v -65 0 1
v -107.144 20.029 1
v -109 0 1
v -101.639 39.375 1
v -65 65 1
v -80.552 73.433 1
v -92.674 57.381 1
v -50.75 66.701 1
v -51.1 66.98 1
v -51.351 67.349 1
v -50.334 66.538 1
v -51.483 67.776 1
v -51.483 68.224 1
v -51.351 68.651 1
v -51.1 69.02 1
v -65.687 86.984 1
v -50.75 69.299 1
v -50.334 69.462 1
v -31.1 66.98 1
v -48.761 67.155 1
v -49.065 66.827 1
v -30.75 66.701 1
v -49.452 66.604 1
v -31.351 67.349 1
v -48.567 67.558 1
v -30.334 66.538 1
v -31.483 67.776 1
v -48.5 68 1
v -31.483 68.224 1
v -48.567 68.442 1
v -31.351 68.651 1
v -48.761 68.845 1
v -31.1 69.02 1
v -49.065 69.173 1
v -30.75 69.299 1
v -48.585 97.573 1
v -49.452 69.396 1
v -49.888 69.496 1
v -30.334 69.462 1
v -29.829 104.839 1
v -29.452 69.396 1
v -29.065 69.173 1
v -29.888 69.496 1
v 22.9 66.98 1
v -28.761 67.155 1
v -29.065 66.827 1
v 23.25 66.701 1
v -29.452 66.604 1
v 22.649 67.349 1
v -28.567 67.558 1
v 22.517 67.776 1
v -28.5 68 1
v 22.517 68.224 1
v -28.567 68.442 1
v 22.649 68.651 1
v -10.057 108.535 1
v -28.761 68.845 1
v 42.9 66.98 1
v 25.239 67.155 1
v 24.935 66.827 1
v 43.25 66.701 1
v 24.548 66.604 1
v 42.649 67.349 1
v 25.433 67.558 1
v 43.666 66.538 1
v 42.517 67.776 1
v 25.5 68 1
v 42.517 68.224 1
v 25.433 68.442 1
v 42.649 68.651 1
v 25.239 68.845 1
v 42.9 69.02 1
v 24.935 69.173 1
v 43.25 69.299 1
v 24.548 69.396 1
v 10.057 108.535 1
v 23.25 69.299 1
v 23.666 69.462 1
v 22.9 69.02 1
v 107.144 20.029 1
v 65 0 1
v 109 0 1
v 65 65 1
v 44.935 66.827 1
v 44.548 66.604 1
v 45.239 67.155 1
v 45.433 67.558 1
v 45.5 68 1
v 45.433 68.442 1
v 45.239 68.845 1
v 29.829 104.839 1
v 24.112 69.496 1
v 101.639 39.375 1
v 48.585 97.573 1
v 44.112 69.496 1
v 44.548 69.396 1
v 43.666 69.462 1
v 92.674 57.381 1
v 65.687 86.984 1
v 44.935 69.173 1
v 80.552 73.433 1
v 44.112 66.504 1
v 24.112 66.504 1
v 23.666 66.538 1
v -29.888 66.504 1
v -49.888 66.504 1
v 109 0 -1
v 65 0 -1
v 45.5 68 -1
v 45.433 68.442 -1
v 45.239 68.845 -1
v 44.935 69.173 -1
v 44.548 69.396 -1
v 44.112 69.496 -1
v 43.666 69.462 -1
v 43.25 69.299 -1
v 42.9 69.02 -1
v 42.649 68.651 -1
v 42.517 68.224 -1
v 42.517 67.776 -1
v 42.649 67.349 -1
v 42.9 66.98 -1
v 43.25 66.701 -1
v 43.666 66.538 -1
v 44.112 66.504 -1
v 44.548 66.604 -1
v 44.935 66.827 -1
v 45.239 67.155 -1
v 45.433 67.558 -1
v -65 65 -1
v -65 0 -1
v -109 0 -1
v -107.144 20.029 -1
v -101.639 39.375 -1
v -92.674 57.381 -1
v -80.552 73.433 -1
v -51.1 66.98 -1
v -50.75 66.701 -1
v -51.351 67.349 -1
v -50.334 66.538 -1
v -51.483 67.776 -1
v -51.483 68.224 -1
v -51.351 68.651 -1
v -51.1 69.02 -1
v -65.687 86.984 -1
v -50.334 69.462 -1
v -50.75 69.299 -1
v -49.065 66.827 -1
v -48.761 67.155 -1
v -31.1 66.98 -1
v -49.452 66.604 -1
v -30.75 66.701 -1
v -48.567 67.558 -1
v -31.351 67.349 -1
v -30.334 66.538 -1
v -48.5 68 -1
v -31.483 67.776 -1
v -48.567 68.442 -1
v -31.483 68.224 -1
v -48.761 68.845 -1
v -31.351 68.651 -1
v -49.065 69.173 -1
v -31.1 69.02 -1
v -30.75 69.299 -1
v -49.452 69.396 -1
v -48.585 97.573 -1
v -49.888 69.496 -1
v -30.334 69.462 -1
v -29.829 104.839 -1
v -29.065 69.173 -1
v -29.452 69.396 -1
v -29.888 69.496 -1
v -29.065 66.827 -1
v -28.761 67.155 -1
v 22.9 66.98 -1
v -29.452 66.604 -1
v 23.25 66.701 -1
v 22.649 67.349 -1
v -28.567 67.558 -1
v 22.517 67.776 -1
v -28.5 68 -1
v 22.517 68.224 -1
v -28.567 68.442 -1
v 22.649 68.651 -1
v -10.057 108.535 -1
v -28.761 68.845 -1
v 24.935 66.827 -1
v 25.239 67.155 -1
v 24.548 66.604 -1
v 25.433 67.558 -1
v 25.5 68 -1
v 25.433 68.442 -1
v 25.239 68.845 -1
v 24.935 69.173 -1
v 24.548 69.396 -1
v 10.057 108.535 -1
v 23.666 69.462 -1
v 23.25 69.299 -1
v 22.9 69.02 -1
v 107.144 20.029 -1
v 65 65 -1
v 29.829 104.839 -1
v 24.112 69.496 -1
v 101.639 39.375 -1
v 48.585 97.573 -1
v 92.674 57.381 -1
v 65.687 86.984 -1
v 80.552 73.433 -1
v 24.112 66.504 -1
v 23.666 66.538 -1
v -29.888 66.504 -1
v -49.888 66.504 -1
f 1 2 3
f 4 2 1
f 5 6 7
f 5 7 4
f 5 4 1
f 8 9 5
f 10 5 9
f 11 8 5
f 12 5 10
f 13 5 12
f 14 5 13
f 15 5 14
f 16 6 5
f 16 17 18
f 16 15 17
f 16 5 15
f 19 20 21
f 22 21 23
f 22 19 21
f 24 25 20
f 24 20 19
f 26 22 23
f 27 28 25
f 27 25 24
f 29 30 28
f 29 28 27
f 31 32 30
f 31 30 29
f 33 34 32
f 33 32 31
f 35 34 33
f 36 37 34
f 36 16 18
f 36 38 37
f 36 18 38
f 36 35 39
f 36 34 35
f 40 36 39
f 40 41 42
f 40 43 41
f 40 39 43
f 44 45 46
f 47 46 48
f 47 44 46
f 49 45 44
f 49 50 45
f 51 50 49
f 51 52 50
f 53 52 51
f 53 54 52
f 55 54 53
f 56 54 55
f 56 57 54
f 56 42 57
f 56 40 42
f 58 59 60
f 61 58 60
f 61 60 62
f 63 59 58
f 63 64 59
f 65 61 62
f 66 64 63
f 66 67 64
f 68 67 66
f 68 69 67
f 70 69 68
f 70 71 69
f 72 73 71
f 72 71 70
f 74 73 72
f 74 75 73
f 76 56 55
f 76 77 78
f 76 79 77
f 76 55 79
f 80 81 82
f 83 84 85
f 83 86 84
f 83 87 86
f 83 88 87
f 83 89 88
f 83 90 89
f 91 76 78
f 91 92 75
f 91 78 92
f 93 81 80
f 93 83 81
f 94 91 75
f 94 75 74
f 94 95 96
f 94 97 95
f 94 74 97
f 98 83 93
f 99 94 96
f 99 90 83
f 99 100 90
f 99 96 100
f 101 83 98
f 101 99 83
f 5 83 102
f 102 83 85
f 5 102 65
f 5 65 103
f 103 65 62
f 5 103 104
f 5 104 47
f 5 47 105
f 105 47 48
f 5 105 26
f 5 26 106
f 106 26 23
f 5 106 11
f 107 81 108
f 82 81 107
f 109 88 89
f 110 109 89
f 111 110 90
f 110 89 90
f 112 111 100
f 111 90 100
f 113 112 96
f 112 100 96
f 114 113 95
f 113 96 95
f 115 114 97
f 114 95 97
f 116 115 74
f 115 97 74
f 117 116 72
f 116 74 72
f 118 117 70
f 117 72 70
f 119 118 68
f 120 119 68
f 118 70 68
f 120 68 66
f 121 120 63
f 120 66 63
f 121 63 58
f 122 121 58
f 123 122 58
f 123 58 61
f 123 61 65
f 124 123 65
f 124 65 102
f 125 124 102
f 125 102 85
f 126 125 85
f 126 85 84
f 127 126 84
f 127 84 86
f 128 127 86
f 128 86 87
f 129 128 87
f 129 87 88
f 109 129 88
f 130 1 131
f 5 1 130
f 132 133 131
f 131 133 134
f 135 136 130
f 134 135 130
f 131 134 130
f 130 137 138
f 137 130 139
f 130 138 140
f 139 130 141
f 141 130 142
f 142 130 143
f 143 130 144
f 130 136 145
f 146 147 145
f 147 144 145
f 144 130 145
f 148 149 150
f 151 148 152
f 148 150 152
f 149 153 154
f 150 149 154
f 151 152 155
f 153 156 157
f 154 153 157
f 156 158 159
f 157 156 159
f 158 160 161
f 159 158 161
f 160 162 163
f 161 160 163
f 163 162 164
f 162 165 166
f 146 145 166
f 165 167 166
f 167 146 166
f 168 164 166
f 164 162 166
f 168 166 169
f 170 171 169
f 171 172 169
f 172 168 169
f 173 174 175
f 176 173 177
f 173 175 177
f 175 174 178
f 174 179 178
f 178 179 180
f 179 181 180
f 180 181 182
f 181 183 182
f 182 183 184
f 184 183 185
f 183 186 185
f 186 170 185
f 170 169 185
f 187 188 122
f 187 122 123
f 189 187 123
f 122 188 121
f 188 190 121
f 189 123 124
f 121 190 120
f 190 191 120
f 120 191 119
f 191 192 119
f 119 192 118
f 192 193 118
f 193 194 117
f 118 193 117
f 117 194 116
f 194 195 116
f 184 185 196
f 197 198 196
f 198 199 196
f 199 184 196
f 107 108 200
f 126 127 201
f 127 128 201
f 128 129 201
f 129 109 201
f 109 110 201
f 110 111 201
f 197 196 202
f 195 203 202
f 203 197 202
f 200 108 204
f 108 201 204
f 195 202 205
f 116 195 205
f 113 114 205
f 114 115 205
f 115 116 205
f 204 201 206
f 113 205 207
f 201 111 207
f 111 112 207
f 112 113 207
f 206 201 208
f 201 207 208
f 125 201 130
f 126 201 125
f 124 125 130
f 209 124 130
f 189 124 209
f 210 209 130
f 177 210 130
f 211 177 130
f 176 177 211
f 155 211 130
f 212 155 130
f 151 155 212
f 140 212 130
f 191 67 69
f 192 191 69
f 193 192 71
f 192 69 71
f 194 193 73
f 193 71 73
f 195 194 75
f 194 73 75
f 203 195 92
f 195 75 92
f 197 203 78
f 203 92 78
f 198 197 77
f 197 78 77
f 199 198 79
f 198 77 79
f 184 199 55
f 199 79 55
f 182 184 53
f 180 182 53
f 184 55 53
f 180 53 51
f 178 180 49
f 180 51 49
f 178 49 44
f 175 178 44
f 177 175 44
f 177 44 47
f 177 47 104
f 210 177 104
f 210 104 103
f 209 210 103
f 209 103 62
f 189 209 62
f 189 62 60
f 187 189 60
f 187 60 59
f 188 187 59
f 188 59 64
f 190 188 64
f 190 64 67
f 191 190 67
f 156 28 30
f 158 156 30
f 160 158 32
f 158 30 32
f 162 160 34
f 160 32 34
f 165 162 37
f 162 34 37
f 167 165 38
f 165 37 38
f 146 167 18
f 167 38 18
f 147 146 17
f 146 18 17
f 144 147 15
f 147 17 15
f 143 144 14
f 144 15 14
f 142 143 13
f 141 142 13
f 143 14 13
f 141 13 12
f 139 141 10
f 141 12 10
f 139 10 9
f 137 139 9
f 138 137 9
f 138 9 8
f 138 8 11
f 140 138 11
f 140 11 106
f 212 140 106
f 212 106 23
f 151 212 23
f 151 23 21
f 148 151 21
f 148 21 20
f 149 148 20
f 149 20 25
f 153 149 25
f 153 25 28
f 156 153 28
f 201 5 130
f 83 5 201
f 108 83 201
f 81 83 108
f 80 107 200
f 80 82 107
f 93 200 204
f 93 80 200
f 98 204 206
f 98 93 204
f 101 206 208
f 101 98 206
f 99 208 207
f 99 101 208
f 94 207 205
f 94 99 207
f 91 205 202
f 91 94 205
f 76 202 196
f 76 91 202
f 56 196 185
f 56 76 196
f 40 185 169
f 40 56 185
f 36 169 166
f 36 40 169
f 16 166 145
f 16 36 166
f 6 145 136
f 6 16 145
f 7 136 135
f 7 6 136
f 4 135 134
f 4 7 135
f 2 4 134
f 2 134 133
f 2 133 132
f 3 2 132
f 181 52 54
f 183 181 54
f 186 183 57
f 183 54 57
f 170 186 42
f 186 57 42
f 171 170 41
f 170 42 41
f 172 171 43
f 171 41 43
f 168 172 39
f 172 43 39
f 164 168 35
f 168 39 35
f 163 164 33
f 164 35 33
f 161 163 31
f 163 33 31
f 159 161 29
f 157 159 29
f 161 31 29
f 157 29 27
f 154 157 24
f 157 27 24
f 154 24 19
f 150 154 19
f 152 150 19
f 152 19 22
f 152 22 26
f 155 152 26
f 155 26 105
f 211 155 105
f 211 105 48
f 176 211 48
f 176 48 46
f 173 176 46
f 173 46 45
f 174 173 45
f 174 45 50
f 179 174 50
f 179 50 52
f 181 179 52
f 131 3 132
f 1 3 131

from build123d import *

# Parameters (mm, degrees)
EXTRUDE_1_DEPTH     = 1
SKETCH_2_R          = 1.5
CUT_EXTRUDE_1_DEPTH = 10


with BuildPart() as part:
    # 草图1 → 凸台-拉伸1 (new, symmetric)
    with BuildSketch(Plane.XY):
        with BuildLine():
            ThreePointArc((109, 0), (0, 109), (-109, 0))
            Line((-109, 0), (-65, 0))
            Line((-65, 0), (-65, 65))
            Line((-65, 65), (65, 65))
            Line((65, 65), (65, 0))
            Line((65, 0), (109, 0))
        make_face()
    extrude(amount=EXTRUDE_1_DEPTH, both=True)

    # 草图2 → 切除-拉伸1 (cut)
    with BuildSketch(Plane.XY.offset(1)):
        with Locations((44, 68)):
            Circle(SKETCH_2_R)
        with Locations((24, 68)):
            Circle(SKETCH_2_R)
        with Locations((-30, 68)):
            Circle(SKETCH_2_R)
        with Locations((-50, 68)):
            Circle(SKETCH_2_R)
    extrude(amount=-CUT_EXTRUDE_1_DEPTH, mode=Mode.SUBTRACT)


solid = part.part
